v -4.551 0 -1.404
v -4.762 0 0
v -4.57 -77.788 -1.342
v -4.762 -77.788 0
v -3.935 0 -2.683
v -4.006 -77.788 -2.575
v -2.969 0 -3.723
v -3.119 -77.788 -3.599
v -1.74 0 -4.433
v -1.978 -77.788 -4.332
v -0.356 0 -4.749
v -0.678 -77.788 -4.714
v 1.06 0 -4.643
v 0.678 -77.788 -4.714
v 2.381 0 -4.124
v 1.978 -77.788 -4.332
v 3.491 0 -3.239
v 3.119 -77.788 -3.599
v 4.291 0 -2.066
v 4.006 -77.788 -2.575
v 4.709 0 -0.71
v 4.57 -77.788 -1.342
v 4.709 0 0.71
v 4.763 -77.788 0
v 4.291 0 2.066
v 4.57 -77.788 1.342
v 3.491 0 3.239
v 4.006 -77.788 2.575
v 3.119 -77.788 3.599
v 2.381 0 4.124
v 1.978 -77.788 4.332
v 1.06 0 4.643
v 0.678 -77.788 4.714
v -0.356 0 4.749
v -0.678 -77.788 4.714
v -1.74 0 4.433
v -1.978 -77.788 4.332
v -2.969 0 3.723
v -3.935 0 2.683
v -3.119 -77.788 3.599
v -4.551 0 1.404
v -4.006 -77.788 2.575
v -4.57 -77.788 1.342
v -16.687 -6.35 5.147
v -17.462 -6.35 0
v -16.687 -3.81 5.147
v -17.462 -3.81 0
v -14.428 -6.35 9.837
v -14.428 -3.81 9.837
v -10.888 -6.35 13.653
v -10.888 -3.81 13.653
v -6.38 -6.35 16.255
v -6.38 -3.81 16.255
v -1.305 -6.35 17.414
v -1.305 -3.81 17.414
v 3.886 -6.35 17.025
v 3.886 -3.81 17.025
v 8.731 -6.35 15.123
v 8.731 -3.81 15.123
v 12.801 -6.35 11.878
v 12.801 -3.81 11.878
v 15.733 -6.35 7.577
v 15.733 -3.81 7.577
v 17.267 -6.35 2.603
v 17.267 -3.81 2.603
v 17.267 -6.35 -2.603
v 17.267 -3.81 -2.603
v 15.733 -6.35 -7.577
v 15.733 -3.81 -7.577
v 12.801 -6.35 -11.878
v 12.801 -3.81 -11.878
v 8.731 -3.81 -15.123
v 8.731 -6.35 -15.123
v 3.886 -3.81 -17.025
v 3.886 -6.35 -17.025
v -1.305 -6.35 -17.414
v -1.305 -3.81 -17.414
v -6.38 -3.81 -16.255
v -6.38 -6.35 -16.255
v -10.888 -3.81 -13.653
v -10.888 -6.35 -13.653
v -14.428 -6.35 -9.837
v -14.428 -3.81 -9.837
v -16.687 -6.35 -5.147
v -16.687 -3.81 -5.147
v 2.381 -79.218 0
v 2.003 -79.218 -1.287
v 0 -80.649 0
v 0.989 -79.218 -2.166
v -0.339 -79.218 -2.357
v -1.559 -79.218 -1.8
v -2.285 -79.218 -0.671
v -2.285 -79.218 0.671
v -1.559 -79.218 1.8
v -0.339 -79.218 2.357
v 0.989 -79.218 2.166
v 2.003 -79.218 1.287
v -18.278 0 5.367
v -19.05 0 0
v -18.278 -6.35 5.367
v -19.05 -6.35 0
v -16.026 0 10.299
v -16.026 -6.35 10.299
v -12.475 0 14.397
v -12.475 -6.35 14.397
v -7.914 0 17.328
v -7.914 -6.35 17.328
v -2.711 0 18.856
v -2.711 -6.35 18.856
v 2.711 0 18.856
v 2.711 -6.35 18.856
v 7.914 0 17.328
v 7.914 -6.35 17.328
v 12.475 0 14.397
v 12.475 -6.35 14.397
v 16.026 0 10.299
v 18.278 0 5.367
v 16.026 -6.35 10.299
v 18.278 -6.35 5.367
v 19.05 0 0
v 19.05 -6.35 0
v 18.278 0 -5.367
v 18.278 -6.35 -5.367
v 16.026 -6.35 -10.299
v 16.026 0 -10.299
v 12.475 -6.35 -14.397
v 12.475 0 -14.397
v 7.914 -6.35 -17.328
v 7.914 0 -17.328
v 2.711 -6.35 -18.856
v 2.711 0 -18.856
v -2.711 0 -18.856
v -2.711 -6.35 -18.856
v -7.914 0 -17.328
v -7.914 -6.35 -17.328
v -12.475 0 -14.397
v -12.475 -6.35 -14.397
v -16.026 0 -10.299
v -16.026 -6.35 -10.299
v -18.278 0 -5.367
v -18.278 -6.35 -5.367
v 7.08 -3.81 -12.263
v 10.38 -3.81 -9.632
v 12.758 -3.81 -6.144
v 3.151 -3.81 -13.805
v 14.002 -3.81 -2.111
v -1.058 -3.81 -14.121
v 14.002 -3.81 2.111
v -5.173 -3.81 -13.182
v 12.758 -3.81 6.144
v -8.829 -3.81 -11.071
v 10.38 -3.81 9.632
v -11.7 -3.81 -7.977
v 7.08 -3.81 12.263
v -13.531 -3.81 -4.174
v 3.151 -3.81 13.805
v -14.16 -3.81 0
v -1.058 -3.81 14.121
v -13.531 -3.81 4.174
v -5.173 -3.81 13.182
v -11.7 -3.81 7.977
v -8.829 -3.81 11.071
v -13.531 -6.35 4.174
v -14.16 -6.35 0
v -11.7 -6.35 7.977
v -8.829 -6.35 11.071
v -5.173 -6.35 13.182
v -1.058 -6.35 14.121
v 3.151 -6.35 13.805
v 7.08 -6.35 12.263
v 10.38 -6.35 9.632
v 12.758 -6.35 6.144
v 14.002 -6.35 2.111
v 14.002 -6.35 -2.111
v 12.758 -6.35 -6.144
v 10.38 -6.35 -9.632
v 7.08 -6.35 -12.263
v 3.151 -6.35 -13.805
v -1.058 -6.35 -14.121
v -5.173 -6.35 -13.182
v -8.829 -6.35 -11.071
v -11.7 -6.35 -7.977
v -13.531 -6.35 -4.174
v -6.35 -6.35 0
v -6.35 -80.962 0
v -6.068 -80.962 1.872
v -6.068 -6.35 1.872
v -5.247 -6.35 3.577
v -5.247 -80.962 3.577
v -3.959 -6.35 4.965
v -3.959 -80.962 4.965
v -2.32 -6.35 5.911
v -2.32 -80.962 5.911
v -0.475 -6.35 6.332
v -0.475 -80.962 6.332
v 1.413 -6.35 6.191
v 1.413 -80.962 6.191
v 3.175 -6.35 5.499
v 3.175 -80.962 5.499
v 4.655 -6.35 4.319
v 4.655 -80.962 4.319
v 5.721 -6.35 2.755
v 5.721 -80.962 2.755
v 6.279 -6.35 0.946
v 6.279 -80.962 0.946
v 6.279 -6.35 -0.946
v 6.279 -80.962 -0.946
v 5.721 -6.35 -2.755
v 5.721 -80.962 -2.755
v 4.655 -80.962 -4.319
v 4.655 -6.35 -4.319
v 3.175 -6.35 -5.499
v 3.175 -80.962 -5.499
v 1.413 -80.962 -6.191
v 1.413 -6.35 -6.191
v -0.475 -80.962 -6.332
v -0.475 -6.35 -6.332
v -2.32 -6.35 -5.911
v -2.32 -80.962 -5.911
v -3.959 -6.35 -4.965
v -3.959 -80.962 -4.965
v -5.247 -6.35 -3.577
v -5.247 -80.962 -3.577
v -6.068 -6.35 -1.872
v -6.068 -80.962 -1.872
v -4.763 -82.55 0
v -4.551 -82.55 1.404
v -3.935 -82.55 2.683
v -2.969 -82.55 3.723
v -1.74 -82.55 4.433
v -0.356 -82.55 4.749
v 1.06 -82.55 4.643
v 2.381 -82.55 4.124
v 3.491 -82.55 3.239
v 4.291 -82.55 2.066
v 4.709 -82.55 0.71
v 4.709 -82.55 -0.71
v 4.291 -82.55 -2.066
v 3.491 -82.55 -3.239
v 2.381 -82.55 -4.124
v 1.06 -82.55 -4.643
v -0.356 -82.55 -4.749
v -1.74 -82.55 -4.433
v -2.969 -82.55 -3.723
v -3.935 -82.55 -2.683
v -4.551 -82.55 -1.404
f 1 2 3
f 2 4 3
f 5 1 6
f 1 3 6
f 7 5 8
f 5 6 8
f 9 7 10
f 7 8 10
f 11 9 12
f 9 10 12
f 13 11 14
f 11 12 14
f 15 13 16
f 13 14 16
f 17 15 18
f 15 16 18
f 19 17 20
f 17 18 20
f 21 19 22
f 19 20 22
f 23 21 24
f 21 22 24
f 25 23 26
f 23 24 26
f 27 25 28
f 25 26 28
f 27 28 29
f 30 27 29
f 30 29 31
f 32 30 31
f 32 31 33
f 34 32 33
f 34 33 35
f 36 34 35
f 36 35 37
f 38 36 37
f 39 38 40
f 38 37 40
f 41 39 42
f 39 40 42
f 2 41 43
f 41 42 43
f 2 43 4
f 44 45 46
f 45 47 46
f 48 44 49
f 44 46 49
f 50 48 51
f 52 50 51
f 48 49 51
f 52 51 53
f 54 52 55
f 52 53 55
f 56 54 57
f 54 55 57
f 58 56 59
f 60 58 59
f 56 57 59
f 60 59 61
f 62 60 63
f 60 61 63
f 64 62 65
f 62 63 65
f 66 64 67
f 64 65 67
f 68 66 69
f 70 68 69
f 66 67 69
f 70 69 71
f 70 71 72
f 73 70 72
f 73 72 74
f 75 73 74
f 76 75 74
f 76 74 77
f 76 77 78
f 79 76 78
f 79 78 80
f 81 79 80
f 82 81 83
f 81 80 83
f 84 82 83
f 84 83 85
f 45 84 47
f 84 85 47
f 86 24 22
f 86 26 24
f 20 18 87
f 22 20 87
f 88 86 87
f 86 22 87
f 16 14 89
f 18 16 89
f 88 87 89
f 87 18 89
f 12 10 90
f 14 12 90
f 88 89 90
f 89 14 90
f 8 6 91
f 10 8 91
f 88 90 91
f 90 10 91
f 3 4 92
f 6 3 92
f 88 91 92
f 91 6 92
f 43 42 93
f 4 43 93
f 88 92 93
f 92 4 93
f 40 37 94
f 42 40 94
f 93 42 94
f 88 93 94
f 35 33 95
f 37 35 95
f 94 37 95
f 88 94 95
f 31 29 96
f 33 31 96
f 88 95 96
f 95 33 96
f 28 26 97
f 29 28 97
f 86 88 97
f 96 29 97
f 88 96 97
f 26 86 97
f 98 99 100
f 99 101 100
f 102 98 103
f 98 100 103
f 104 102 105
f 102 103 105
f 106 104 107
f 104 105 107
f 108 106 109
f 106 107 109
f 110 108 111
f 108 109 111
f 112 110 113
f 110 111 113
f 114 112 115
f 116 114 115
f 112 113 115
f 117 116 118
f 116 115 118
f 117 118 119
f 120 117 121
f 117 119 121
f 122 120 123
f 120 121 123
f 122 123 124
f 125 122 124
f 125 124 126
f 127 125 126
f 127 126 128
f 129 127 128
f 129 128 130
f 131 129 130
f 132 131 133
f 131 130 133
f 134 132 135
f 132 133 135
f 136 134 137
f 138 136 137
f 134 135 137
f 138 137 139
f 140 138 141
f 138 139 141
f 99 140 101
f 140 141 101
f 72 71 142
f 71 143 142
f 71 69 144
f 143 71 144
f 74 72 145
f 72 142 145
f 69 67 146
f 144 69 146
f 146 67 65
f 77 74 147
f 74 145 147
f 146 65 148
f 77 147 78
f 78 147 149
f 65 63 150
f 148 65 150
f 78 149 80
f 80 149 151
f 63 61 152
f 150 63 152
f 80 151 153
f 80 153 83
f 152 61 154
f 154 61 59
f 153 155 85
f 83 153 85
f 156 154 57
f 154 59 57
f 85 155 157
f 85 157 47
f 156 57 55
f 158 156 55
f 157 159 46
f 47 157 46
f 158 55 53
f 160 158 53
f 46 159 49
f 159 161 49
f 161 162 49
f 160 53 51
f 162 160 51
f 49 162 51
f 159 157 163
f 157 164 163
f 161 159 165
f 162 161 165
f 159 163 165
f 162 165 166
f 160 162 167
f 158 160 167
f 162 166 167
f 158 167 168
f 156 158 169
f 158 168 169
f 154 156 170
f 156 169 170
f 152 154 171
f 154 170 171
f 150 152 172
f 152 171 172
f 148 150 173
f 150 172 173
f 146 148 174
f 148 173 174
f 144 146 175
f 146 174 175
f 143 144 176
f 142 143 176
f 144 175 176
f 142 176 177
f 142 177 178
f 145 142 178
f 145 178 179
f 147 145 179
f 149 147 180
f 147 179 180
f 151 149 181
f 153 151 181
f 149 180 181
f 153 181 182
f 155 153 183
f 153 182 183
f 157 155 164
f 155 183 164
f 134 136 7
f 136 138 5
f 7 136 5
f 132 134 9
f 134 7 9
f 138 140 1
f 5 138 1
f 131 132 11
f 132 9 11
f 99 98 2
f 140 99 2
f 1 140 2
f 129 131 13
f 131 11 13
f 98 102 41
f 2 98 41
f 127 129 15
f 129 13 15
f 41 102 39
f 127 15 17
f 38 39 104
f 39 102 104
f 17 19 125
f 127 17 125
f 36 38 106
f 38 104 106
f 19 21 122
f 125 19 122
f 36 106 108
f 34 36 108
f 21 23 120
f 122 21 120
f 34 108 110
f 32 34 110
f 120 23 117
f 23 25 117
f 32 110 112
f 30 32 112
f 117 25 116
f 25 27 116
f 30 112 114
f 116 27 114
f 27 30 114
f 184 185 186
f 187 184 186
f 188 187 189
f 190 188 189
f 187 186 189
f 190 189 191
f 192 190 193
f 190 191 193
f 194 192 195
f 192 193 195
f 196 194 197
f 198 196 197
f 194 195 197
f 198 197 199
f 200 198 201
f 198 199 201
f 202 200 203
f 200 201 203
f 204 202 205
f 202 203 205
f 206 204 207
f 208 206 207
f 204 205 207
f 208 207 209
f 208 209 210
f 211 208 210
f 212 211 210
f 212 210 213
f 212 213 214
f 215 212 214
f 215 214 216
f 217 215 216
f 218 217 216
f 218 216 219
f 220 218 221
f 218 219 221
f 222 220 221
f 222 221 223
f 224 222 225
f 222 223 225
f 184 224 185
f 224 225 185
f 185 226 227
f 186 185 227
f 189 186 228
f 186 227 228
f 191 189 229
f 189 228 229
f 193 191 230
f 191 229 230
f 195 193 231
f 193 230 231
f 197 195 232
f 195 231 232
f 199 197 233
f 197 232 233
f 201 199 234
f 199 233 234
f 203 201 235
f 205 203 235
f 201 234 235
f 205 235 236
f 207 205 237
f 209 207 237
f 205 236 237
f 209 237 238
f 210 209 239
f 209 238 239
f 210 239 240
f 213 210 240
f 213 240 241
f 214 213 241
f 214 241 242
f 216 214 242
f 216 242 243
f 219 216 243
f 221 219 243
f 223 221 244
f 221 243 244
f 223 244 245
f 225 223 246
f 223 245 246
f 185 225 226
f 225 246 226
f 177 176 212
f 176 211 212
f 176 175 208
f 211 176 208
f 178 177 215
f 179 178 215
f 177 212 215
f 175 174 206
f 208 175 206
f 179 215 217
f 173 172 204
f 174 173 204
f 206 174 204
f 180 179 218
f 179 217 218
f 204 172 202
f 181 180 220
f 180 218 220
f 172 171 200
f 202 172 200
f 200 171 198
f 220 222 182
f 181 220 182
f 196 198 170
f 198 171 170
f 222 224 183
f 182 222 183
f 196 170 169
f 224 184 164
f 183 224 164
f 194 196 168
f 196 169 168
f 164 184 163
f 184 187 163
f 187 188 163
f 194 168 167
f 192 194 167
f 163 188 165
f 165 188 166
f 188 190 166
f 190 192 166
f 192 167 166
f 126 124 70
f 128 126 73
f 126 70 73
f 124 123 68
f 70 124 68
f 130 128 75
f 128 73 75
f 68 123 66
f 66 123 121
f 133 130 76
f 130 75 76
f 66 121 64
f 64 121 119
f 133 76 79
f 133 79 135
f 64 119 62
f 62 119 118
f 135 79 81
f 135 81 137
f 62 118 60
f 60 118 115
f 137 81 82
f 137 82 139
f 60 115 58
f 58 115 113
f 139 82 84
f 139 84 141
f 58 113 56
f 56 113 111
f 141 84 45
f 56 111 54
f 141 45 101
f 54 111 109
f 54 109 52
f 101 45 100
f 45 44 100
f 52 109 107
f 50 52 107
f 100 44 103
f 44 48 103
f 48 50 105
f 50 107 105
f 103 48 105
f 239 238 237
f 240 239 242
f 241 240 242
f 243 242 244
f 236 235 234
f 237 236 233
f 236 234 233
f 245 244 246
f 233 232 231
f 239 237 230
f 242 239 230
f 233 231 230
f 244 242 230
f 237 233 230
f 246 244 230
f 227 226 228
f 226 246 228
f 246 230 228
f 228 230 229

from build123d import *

# Parameters (mm, degrees)
F_3_8_0_375_DIAMETER_HOLE1_D     = 9.525
F_3_8_0_375_DIAMETER_HOLE1_DEPTH = 77.7875
F_3_8_0_375_DIAMETER_HOLE1_TIP   = 2.861598698
CHAMFER1_SIZE                    = 1.5875


with BuildPart() as part:
    # Sketch1 → Revolve1 (revolve)
    with BuildSketch(Plane.XY):
        Polygon((0, 0), (-19.05, 0), (-19.05, -6.35), (-17.4625, -6.35), (-17.4625, -3.81), (-14.1605, -3.81), (-14.1605, -6.35), (-6.35, -6.35), (-6.35, -82.55), (0, -82.55), align=None)
    revolve(axis=Axis((0, -82.55, 0), (0, 1, 0)))

    # 3/8 (0.375) Diameter Hole1
    with Locations(Plane(origin=(0, 0, 0), x_dir=(1, 0, 0), z_dir=(0, 1, 0))):
        with Locations((0, 0)):
            Hole(F_3_8_0_375_DIAMETER_HOLE1_D / 2, depth=F_3_8_0_375_DIAMETER_HOLE1_DEPTH)
            with Locations((0, 0, -(F_3_8_0_375_DIAMETER_HOLE1_DEPTH + F_3_8_0_375_DIAMETER_HOLE1_TIP / 2))):  # 118° drill point
                Cone(0, F_3_8_0_375_DIAMETER_HOLE1_D / 2, F_3_8_0_375_DIAMETER_HOLE1_TIP, mode=Mode.SUBTRACT)

    # Chamfer1
    chamfer1_edges = [part.edges().sort_by_distance(p)[0] for p in [
        (6.35, -82.55, 0),
    ]]
    chamfer(chamfer1_edges, length=CHAMFER1_SIZE)


solid = part.part
